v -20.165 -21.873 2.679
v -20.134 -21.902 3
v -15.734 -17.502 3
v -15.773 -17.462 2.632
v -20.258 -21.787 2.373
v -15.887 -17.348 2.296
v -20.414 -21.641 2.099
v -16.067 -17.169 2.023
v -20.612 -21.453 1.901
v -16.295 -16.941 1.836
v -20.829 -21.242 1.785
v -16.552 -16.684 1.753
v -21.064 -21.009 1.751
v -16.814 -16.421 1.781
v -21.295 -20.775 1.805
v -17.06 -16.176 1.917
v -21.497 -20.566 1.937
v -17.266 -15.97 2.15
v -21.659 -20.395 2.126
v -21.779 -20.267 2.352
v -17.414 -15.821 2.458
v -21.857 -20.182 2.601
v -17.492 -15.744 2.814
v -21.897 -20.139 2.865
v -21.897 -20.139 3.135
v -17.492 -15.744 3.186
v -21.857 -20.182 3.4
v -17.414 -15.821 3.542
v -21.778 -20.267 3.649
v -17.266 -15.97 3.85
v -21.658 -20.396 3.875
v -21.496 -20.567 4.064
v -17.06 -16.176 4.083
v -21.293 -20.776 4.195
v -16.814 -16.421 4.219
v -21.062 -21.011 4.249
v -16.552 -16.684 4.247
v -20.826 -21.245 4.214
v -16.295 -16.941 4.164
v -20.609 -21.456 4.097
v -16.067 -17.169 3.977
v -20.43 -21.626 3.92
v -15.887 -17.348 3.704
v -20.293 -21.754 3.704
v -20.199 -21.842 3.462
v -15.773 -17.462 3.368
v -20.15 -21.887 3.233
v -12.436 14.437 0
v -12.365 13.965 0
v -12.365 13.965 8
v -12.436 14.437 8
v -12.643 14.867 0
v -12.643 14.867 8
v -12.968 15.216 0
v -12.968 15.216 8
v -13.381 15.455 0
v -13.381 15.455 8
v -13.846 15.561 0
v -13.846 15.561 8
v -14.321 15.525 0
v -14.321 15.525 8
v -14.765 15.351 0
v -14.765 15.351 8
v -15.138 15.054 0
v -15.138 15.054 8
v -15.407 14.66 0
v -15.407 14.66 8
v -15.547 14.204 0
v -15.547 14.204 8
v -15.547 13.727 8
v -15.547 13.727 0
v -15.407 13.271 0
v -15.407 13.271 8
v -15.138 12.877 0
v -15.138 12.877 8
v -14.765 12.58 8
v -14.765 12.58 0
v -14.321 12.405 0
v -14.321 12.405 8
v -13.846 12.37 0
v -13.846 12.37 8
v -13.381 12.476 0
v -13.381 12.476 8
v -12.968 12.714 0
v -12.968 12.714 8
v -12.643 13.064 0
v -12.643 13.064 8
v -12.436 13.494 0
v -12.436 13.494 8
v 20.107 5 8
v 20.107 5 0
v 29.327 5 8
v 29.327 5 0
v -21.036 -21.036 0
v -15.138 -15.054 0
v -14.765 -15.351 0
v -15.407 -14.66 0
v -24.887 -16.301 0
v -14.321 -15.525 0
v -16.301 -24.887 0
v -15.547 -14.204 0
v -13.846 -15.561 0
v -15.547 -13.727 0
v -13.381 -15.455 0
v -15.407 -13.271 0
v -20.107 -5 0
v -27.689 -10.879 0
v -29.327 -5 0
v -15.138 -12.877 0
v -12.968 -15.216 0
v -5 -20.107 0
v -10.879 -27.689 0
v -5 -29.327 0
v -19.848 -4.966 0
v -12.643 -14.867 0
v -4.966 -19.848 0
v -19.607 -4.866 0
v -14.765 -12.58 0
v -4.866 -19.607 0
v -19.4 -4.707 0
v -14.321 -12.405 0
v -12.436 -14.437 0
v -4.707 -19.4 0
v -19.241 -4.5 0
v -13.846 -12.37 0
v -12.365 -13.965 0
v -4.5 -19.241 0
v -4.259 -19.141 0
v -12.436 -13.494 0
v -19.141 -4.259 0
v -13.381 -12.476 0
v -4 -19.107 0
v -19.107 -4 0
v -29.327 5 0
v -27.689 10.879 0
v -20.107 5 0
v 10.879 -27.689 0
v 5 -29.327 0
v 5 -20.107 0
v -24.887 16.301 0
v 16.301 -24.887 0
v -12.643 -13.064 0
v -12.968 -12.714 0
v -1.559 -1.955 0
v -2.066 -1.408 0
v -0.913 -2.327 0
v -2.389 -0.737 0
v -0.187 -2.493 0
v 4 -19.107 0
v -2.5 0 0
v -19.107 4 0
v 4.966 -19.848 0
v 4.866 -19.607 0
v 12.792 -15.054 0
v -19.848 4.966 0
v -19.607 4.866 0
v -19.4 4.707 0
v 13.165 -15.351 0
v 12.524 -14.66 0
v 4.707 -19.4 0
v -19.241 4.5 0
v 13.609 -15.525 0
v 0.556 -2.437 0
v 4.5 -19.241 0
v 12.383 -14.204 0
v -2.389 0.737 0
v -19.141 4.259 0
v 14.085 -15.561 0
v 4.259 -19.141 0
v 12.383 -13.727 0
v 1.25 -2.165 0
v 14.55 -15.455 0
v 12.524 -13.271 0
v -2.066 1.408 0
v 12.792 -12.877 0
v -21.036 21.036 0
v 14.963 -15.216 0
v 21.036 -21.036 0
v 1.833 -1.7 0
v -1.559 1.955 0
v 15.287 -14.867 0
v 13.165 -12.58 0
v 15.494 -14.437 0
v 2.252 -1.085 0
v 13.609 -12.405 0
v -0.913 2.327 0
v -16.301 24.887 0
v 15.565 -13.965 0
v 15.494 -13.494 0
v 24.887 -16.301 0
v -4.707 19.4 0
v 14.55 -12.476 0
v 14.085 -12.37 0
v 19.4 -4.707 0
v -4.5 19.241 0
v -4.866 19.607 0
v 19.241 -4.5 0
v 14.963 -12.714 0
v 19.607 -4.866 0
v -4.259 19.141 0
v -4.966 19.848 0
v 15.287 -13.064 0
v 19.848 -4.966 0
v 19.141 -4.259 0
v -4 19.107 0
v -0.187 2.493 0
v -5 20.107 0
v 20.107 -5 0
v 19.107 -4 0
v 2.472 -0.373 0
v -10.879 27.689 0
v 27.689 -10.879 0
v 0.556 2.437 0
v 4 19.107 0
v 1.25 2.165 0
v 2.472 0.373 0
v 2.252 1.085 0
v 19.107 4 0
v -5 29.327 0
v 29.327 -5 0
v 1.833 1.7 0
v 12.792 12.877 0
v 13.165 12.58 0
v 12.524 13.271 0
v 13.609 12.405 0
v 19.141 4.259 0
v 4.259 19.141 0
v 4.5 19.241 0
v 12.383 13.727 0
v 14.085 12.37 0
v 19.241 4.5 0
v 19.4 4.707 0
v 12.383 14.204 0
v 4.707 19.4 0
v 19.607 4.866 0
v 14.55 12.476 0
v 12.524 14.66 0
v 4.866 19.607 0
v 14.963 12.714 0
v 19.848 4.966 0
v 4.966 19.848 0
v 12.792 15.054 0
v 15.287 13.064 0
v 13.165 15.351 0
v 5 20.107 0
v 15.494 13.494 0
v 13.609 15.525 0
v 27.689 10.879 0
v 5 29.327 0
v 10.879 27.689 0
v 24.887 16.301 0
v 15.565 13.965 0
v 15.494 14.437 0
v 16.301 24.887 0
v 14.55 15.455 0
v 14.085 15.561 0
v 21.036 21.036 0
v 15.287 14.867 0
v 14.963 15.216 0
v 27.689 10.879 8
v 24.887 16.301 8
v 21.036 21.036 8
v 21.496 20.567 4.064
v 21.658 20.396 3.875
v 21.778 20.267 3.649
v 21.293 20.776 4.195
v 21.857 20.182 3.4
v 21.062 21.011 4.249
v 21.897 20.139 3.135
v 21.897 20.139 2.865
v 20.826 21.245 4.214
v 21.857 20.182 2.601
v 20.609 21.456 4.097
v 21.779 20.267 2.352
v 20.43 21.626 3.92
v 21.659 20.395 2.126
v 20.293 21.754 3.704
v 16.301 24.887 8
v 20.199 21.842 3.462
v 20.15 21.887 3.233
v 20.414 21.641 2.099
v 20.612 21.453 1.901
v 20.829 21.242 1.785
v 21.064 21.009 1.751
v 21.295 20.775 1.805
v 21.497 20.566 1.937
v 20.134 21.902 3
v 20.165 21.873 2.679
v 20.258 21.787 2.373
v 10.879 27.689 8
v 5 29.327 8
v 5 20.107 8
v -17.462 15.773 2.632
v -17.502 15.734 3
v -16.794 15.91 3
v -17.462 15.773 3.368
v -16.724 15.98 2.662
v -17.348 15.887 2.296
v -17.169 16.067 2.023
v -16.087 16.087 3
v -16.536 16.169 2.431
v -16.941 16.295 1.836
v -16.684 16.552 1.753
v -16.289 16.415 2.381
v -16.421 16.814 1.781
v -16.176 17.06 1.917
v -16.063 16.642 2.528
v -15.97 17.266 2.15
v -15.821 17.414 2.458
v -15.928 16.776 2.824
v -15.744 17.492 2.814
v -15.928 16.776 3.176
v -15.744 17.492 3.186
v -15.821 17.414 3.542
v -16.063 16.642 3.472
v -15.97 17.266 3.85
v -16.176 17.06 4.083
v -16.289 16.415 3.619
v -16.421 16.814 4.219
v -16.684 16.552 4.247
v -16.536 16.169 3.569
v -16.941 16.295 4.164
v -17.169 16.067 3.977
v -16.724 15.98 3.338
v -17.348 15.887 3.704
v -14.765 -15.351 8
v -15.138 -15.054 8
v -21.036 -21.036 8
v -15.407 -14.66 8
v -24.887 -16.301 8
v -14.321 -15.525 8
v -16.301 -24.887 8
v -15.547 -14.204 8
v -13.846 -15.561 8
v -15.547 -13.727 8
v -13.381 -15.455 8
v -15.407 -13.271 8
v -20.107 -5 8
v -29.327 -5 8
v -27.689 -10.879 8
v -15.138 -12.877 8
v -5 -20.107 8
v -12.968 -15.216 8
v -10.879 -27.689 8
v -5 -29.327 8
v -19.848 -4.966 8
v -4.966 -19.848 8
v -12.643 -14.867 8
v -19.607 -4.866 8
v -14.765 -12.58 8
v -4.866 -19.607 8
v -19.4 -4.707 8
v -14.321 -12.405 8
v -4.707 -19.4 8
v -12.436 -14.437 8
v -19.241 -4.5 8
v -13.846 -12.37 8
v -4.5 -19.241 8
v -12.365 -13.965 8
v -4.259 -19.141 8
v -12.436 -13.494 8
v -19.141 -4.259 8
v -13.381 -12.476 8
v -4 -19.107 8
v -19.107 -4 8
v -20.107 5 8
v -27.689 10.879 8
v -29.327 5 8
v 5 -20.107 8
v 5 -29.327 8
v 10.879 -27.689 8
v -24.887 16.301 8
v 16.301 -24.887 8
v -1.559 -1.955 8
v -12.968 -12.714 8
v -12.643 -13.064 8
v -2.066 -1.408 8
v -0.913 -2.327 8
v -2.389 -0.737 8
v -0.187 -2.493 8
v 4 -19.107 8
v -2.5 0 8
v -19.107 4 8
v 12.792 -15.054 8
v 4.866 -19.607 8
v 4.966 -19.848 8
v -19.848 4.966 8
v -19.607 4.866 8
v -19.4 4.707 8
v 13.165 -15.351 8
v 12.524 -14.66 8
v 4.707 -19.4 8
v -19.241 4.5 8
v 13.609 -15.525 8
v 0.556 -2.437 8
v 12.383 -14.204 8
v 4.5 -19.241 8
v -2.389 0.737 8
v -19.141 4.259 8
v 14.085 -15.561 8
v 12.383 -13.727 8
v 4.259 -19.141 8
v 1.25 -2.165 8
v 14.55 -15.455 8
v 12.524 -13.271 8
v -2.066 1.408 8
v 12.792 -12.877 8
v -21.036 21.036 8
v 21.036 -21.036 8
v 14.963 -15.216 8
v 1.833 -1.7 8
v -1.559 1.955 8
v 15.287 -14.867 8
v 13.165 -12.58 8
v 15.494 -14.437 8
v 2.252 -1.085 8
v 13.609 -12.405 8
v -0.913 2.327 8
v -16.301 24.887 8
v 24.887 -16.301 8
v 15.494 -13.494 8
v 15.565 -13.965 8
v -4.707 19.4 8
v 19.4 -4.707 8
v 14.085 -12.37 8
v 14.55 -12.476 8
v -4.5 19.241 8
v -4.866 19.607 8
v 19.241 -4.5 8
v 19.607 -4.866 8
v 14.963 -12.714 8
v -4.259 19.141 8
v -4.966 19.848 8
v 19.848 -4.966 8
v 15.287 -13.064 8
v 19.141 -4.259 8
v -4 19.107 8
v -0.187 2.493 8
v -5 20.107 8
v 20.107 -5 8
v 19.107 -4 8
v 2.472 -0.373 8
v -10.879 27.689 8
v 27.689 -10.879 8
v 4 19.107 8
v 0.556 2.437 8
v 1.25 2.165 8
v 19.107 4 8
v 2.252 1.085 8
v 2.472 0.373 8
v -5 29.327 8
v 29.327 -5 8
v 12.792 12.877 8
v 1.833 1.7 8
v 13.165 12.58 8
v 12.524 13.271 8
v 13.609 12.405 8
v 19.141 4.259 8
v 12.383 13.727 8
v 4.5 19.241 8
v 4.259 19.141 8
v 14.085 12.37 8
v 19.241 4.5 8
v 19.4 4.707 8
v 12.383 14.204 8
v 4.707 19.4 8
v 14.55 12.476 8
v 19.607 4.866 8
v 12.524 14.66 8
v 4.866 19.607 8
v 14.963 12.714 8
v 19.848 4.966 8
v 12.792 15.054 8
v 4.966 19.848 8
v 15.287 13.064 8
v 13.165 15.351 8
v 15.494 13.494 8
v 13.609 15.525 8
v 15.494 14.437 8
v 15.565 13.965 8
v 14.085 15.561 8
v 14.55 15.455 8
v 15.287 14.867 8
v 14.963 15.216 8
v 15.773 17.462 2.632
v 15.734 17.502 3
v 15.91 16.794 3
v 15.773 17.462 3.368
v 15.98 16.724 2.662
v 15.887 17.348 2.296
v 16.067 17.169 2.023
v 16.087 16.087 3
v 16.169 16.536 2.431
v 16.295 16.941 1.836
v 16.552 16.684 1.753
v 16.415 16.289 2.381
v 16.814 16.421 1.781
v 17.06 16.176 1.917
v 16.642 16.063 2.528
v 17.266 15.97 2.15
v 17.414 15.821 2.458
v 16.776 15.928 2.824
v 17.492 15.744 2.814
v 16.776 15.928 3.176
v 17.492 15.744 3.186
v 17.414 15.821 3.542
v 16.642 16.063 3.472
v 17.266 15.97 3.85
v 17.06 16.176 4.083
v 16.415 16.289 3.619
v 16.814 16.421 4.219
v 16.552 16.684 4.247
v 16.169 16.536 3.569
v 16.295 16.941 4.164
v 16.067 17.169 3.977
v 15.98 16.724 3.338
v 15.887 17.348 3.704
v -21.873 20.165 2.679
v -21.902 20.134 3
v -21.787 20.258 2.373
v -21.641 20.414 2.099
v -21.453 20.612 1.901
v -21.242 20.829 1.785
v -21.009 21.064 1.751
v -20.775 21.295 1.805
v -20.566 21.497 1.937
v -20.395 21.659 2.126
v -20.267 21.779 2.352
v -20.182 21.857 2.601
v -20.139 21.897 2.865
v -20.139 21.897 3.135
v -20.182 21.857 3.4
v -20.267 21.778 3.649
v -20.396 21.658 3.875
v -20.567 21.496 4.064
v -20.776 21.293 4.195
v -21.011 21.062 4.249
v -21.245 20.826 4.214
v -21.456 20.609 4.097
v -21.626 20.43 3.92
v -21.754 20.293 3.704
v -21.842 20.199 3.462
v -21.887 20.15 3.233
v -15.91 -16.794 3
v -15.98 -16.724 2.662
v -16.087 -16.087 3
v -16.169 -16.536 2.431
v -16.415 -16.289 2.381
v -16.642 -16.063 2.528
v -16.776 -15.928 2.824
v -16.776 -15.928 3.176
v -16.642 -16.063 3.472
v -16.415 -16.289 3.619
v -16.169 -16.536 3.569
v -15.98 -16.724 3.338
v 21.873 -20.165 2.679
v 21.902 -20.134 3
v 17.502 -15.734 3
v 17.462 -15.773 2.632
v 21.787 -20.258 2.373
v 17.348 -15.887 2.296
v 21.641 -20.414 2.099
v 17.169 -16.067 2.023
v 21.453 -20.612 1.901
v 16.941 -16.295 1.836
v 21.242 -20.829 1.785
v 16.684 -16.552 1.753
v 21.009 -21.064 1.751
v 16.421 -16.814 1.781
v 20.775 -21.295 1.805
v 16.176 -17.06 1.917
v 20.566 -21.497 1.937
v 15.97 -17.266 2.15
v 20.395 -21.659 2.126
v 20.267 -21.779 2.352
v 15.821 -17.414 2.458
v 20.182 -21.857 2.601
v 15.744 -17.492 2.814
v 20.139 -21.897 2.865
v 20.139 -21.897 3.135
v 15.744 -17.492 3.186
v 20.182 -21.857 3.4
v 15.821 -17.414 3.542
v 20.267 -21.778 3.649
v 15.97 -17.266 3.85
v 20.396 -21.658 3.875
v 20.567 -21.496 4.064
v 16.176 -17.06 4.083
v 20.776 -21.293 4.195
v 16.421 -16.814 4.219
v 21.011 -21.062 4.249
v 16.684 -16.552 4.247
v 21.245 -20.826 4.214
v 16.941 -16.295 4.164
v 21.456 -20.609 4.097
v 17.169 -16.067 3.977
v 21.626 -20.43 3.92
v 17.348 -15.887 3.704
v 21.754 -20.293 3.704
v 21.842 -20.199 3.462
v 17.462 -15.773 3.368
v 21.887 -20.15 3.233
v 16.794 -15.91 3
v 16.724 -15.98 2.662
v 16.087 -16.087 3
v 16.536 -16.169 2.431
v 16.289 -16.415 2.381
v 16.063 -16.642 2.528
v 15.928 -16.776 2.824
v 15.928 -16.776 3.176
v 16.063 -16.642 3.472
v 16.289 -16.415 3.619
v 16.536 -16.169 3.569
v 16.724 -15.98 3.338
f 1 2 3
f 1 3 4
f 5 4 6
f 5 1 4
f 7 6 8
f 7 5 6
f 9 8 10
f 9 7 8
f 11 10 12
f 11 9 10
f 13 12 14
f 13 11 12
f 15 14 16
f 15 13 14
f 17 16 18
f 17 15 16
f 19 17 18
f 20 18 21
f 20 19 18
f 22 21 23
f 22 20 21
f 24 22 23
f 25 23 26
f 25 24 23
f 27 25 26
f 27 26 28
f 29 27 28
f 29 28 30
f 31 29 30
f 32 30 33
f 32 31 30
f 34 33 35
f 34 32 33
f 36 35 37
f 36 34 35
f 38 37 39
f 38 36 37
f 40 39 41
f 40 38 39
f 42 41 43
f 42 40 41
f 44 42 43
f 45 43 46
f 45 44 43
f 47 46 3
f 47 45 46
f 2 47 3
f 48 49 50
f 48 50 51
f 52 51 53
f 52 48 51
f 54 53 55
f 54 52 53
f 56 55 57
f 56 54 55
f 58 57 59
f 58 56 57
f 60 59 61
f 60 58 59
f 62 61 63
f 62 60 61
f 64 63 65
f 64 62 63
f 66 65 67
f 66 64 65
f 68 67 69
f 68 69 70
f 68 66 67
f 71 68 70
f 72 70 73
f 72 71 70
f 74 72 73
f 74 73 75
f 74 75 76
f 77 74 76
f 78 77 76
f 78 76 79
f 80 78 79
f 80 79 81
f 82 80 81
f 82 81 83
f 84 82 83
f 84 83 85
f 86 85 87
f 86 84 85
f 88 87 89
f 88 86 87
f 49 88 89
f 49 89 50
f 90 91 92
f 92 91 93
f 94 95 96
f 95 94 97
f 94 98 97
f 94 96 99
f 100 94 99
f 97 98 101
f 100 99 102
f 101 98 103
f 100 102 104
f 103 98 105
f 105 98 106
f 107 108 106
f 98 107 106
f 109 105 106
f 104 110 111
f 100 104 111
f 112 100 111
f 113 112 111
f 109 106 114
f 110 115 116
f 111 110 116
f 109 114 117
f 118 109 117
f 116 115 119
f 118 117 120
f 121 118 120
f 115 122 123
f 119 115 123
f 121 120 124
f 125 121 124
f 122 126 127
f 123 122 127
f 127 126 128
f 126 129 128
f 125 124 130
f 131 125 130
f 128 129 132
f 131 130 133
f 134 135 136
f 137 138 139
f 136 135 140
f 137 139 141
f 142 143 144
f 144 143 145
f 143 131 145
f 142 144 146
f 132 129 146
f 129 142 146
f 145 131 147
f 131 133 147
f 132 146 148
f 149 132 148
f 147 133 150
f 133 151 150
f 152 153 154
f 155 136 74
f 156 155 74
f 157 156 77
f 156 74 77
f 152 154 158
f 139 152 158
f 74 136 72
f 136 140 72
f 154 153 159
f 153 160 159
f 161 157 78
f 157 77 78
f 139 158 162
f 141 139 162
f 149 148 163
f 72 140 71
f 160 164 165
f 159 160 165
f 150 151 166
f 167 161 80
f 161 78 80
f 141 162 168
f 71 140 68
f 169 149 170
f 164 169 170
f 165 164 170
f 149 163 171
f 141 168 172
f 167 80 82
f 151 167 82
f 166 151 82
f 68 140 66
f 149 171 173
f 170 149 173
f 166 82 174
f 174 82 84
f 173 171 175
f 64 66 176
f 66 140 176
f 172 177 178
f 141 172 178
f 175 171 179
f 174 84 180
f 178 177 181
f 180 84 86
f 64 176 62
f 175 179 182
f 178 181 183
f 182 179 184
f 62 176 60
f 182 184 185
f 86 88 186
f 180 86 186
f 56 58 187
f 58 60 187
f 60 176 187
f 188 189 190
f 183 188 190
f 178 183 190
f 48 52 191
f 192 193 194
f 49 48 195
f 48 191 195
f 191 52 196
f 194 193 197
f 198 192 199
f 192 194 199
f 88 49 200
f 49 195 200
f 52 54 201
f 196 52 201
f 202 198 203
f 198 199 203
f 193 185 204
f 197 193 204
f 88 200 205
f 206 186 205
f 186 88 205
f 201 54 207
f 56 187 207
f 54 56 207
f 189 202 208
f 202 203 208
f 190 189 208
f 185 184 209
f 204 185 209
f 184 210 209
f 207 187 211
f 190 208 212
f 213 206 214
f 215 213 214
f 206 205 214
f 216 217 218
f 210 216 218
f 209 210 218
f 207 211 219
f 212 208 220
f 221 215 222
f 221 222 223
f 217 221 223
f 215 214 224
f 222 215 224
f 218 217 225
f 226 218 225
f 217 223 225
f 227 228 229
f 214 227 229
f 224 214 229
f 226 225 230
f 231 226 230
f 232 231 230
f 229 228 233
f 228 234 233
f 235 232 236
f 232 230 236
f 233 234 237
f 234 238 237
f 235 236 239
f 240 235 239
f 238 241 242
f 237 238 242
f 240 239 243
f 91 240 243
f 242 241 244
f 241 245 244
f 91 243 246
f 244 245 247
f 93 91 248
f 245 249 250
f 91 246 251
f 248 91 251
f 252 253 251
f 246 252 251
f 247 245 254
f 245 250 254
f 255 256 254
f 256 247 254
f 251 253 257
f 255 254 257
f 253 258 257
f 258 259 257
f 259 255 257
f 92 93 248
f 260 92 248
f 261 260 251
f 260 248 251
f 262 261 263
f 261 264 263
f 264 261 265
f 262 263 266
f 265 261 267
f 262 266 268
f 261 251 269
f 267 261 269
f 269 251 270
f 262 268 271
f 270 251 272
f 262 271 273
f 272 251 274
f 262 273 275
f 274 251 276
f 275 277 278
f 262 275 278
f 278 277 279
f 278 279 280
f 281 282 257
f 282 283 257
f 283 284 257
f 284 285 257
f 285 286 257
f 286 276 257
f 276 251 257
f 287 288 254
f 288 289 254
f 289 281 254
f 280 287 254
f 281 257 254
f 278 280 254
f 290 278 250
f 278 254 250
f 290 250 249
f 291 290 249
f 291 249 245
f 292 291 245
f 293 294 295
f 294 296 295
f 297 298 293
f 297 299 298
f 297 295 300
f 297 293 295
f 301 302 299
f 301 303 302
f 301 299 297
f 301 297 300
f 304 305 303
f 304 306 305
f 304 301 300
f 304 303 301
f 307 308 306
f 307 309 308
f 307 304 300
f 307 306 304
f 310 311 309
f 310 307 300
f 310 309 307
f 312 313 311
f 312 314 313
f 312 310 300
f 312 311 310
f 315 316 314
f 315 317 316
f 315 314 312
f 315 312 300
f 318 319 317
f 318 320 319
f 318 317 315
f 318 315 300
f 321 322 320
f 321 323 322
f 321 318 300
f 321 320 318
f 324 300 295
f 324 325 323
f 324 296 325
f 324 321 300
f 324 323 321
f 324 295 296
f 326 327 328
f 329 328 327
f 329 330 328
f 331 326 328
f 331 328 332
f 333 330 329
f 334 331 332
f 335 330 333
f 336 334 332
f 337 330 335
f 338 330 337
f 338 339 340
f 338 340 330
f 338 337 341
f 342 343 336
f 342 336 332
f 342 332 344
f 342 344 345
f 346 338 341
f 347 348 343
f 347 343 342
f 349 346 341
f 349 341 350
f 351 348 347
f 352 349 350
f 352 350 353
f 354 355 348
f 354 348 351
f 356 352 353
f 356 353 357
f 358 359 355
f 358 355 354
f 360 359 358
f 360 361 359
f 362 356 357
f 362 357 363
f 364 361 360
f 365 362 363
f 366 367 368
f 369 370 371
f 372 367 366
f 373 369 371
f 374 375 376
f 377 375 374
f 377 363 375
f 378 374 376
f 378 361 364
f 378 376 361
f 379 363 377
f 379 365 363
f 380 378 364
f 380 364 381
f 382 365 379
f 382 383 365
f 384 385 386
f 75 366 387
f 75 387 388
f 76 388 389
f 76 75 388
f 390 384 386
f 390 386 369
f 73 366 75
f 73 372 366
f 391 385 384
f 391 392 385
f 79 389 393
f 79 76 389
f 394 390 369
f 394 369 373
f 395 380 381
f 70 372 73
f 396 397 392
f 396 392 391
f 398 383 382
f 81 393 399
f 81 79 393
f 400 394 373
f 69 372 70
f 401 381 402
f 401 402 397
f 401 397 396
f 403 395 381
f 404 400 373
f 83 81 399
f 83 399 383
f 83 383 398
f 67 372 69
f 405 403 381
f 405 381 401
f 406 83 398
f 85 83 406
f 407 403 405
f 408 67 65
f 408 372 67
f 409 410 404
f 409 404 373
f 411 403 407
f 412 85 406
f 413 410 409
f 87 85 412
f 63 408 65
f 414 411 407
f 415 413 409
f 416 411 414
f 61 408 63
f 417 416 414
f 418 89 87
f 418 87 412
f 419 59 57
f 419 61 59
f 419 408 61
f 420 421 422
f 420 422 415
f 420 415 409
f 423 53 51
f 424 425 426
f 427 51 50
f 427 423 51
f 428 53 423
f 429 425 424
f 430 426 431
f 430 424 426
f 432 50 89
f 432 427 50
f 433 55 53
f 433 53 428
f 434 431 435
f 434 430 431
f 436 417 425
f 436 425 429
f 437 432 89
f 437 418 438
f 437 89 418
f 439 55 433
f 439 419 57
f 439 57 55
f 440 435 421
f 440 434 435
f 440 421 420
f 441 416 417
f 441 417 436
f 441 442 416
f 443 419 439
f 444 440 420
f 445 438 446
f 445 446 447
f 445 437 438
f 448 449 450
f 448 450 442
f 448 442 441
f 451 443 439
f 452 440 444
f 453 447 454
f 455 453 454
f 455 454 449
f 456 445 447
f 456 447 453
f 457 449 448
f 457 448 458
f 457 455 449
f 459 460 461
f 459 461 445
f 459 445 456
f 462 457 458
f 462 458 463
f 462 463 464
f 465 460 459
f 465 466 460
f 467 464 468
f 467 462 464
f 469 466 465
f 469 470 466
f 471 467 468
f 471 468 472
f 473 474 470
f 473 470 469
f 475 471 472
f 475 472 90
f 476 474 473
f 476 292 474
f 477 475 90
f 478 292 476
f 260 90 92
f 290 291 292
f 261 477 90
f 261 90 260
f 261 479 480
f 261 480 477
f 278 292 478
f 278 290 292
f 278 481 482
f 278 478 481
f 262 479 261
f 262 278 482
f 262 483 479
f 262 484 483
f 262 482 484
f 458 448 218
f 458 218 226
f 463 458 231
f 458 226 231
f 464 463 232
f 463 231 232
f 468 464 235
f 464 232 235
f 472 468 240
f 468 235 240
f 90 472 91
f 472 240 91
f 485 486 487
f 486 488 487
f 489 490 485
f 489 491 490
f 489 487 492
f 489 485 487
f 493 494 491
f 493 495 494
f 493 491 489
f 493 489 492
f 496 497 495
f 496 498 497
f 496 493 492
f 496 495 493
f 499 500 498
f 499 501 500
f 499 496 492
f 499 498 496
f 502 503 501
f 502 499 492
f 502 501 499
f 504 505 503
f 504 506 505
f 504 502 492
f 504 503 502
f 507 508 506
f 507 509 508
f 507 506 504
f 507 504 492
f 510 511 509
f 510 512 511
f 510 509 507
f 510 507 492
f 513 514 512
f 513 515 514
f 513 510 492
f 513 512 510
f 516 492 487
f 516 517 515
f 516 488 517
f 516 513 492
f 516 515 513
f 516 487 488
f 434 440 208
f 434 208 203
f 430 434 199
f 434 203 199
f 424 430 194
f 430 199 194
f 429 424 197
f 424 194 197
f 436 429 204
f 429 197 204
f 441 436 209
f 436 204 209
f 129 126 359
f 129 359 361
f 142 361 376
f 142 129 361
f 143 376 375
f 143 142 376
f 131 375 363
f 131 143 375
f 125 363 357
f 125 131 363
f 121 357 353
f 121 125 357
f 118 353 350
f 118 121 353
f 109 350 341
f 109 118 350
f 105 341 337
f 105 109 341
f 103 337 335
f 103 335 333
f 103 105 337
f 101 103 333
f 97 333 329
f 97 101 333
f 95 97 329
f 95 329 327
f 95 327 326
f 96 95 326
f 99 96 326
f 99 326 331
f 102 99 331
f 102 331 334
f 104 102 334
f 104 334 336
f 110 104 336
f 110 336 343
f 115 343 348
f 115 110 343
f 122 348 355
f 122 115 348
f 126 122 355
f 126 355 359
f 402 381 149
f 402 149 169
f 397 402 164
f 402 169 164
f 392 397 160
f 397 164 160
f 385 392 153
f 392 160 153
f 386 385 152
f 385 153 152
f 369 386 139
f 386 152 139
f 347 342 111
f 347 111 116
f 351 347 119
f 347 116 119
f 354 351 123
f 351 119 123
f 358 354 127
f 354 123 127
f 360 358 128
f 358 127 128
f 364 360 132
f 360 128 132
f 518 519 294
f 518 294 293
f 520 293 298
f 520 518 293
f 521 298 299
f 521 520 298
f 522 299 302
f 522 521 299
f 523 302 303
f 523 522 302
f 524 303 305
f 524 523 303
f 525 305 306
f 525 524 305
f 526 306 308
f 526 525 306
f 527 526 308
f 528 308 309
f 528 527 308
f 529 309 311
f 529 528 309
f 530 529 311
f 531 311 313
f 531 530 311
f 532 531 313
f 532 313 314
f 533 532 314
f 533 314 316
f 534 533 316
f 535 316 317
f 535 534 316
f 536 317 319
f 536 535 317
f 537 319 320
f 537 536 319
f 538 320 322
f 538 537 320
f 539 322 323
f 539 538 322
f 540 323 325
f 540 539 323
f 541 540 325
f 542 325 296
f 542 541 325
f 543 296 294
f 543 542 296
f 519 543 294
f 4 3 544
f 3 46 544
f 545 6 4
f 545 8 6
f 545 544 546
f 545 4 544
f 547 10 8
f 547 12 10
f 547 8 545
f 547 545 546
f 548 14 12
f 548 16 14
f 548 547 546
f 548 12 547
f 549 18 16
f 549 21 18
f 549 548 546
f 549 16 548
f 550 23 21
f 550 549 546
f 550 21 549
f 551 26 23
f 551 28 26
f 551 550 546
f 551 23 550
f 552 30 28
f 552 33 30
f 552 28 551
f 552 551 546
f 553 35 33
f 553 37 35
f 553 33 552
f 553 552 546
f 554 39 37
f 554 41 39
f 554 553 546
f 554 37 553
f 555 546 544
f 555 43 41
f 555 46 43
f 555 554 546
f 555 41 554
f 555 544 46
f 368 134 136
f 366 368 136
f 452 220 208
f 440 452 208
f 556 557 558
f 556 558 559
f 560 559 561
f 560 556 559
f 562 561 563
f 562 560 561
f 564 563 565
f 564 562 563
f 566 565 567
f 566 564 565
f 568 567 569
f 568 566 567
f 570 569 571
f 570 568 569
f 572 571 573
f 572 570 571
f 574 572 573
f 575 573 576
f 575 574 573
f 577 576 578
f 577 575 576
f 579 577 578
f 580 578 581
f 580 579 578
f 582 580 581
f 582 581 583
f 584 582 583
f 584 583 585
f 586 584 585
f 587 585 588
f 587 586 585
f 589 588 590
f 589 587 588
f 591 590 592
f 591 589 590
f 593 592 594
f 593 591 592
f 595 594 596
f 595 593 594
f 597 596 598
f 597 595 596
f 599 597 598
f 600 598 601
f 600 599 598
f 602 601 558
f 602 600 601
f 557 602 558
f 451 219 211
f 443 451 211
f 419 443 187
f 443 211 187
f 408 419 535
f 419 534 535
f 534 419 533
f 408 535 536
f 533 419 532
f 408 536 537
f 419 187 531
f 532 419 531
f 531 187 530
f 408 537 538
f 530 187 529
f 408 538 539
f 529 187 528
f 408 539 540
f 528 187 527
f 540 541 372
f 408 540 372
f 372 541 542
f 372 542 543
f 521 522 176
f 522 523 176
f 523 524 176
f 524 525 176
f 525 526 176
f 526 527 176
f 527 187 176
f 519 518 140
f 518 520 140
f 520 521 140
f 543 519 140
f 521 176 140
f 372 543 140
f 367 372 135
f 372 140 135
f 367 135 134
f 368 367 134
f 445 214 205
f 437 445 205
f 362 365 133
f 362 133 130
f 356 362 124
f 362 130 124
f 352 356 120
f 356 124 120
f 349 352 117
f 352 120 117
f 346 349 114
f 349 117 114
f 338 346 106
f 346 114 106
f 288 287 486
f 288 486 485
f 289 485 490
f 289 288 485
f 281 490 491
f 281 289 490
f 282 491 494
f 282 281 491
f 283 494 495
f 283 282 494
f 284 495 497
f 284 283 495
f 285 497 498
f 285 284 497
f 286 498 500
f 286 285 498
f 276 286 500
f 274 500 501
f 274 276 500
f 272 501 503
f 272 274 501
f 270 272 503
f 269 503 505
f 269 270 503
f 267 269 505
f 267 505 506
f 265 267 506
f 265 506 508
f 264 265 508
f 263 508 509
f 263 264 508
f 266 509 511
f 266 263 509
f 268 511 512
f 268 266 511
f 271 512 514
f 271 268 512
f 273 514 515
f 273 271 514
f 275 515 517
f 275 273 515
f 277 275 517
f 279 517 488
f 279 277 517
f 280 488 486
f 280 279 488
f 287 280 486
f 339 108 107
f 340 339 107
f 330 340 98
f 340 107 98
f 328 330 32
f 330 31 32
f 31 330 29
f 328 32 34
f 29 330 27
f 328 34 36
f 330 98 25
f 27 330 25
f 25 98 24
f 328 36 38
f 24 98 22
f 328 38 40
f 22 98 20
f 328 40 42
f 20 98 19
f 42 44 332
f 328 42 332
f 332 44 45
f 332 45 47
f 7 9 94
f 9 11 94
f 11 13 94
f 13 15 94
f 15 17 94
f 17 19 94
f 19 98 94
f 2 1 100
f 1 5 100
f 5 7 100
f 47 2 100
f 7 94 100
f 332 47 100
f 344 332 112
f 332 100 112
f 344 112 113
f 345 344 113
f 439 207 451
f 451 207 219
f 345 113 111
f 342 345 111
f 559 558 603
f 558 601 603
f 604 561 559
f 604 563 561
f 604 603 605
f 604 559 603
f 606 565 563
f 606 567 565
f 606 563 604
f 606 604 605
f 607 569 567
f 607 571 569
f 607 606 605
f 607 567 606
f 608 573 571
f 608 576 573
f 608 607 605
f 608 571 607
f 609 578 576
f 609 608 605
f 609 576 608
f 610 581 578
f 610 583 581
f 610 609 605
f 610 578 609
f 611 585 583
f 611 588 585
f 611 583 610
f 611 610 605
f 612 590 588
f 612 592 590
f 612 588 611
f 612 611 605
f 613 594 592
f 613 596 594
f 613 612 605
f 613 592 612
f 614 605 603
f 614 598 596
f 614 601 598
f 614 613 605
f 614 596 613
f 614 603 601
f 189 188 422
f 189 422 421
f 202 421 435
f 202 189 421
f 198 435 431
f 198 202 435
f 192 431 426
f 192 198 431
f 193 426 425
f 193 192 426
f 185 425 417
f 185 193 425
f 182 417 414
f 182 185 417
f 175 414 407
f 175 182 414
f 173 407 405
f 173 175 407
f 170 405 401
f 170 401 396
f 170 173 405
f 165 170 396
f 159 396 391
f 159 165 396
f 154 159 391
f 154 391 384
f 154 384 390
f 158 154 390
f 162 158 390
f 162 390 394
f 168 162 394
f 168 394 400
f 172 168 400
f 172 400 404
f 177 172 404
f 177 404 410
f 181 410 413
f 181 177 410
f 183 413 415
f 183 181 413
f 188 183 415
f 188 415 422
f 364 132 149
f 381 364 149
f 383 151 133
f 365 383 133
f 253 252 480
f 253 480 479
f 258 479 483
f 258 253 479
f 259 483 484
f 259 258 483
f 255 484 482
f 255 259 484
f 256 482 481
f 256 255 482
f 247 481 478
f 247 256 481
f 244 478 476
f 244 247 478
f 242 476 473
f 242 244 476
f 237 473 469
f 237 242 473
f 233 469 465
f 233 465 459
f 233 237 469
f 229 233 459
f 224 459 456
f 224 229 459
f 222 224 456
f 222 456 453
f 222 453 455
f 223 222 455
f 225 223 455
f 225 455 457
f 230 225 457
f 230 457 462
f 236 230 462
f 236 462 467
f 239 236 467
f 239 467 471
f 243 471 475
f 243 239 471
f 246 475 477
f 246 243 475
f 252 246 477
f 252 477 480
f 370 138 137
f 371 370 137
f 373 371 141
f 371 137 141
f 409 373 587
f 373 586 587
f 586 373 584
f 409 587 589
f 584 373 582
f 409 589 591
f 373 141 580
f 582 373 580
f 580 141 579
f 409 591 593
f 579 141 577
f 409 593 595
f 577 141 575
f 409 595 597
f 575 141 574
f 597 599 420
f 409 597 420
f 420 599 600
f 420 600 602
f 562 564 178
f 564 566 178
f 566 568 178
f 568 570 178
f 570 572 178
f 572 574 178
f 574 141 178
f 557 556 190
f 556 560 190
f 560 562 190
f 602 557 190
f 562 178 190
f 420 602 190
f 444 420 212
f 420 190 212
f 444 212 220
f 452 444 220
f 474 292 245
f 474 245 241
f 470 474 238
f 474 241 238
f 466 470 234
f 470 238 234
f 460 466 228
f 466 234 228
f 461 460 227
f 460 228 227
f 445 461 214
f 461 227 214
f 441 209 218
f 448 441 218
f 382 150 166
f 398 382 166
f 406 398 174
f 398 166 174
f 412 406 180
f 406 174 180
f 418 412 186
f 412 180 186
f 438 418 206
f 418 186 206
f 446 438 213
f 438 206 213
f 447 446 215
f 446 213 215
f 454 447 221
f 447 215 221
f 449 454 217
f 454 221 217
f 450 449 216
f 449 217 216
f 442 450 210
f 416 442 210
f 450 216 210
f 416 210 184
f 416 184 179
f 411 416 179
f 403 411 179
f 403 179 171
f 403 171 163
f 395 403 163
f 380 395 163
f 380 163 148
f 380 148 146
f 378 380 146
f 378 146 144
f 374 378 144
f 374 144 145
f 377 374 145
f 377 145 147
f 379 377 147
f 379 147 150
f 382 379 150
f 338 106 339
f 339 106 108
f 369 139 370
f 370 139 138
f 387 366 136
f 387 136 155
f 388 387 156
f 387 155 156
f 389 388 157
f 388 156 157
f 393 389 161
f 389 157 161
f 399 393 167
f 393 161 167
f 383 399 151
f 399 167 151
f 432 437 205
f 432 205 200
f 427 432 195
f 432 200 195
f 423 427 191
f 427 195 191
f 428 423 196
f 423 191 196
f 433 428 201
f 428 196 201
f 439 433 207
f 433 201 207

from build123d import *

# Parameters (mm, degrees)
SKETCH1_R             = 1.6
BOSS_EXTRUDE1_DEPTH   = 8
M6X1_0_TAPPED_HOLE1_D = 5
CIRPATTERN4_COUNT     = 4


with BuildPart() as part:
    # Sketch1 → Boss-Extrude1 (new body)
    with BuildSketch(Plane.XY):
        with BuildLine():
            Line((-29.326822194, 5), (-20.106608804, 5))
            ThreePointArc((-20.106608804, 5), (-19.399502023, 4.707106781), (-19.106608804, 4))
            Line((-19.106608804, 4), (-19.106608804, -4))
            ThreePointArc((-19.106608804, -4), (-19.399502023, -4.707106781), (-20.106608804, -5))
            Line((-20.106608804, -5), (-29.326822194, -5))
            ThreePointArc((-29.326822194, -5), (-21.03642674, -21.03642674), (-5, -29.326822194))
            Line((-5, -29.326822194), (-5, -20.106608804))
            ThreePointArc((-5, -20.106608804), (-4.707106781, -19.399502023), (-4, -19.106608804))
            Line((-4, -19.106608804), (4, -19.106608804))
            ThreePointArc((4, -19.106608804), (4.707106781, -19.399502023), (5, -20.106608804))
            Line((5, -20.106608804), (5, -29.326822194))
            ThreePointArc((5, -29.326822194), (21.03642674, -21.03642674), (29.326822194, -5))
            Line((29.326822194, -5), (20.106608804, -5))
            ThreePointArc((20.106608804, -5), (19.399502023, -4.707106781), (19.106608804, -4))
            Line((19.106608804, -4), (19.106608804, 4))
            ThreePointArc((19.106608804, 4), (19.399502023, 4.707106781), (20.106608804, 5))
            Line((20.106608804, 5), (29.326822194, 5))
            ThreePointArc((29.326822194, 5), (21.03642674, 21.03642674), (5, 29.326822194))
            Line((5, 29.326822194), (5, 20.106608804))
            ThreePointArc((5, 20.106608804), (4.707106781, 19.399502023), (4, 19.106608804))
            Line((4, 19.106608804), (-4, 19.106608804))
            ThreePointArc((-4, 19.106608804), (-4.707106781, 19.399502023), (-5, 20.106608804))
            Line((-5, 20.106608804), (-5, 29.326822194))
            ThreePointArc((-5, 29.326822194), (-21.03642674, 21.03642674), (-29.326822194, 5))
        make_face()
        with Locations((13.965358928, 13.965358928)):
            Circle(SKETCH1_R, mode=Mode.SUBTRACT)
        with Locations((13.965358928, -13.965358928)):
            Circle(SKETCH1_R, mode=Mode.SUBTRACT)
        with Locations((-13.965358928, -13.965358928)):
            Circle(SKETCH1_R, mode=Mode.SUBTRACT)
        with Locations((-13.965358928, 13.965358928)):
            Circle(SKETCH1_R, mode=Mode.SUBTRACT)
    extrude(amount=BOSS_EXTRUDE1_DEPTH)

    # M6x1.0 Tapped Hole1 (through all)
    with Locations(Plane.XY.offset(8)):
        with Locations((0, 0)):
            Hole(M6X1_0_TAPPED_HOLE1_D / 2)

    # Sketch10 → M3x0.5 Tapped Hole2 (revolve, cut)
    with BuildSketch(Plane(origin=(-21.03642674, -21.03642674, 3), x_dir=(0.707106781186559, -0.707106781186536, 0), z_dir=(0, 0, 1))):
        Polygon((0, 0), (0, 7), (1.25, 6.248924226), (1.25, 0), align=None)
    m3x0_5_tapped_hole2 = revolve(axis=Axis((-25.526554801, -25.526554801, 3), (0.707106781186536, 0.707106781186559, 0)), mode=Mode.SUBTRACT)

    # CirPattern4: M3x0.5 Tapped Hole2 ×4 about axis
    cirpattern4_axis = Axis((0, 0, 8), (0, 0, -1))
    for i in range(1, CIRPATTERN4_COUNT):
        add(m3x0_5_tapped_hole2.rotate(cirpattern4_axis, i * 360 / CIRPATTERN4_COUNT), mode=Mode.SUBTRACT)


solid = part.part
